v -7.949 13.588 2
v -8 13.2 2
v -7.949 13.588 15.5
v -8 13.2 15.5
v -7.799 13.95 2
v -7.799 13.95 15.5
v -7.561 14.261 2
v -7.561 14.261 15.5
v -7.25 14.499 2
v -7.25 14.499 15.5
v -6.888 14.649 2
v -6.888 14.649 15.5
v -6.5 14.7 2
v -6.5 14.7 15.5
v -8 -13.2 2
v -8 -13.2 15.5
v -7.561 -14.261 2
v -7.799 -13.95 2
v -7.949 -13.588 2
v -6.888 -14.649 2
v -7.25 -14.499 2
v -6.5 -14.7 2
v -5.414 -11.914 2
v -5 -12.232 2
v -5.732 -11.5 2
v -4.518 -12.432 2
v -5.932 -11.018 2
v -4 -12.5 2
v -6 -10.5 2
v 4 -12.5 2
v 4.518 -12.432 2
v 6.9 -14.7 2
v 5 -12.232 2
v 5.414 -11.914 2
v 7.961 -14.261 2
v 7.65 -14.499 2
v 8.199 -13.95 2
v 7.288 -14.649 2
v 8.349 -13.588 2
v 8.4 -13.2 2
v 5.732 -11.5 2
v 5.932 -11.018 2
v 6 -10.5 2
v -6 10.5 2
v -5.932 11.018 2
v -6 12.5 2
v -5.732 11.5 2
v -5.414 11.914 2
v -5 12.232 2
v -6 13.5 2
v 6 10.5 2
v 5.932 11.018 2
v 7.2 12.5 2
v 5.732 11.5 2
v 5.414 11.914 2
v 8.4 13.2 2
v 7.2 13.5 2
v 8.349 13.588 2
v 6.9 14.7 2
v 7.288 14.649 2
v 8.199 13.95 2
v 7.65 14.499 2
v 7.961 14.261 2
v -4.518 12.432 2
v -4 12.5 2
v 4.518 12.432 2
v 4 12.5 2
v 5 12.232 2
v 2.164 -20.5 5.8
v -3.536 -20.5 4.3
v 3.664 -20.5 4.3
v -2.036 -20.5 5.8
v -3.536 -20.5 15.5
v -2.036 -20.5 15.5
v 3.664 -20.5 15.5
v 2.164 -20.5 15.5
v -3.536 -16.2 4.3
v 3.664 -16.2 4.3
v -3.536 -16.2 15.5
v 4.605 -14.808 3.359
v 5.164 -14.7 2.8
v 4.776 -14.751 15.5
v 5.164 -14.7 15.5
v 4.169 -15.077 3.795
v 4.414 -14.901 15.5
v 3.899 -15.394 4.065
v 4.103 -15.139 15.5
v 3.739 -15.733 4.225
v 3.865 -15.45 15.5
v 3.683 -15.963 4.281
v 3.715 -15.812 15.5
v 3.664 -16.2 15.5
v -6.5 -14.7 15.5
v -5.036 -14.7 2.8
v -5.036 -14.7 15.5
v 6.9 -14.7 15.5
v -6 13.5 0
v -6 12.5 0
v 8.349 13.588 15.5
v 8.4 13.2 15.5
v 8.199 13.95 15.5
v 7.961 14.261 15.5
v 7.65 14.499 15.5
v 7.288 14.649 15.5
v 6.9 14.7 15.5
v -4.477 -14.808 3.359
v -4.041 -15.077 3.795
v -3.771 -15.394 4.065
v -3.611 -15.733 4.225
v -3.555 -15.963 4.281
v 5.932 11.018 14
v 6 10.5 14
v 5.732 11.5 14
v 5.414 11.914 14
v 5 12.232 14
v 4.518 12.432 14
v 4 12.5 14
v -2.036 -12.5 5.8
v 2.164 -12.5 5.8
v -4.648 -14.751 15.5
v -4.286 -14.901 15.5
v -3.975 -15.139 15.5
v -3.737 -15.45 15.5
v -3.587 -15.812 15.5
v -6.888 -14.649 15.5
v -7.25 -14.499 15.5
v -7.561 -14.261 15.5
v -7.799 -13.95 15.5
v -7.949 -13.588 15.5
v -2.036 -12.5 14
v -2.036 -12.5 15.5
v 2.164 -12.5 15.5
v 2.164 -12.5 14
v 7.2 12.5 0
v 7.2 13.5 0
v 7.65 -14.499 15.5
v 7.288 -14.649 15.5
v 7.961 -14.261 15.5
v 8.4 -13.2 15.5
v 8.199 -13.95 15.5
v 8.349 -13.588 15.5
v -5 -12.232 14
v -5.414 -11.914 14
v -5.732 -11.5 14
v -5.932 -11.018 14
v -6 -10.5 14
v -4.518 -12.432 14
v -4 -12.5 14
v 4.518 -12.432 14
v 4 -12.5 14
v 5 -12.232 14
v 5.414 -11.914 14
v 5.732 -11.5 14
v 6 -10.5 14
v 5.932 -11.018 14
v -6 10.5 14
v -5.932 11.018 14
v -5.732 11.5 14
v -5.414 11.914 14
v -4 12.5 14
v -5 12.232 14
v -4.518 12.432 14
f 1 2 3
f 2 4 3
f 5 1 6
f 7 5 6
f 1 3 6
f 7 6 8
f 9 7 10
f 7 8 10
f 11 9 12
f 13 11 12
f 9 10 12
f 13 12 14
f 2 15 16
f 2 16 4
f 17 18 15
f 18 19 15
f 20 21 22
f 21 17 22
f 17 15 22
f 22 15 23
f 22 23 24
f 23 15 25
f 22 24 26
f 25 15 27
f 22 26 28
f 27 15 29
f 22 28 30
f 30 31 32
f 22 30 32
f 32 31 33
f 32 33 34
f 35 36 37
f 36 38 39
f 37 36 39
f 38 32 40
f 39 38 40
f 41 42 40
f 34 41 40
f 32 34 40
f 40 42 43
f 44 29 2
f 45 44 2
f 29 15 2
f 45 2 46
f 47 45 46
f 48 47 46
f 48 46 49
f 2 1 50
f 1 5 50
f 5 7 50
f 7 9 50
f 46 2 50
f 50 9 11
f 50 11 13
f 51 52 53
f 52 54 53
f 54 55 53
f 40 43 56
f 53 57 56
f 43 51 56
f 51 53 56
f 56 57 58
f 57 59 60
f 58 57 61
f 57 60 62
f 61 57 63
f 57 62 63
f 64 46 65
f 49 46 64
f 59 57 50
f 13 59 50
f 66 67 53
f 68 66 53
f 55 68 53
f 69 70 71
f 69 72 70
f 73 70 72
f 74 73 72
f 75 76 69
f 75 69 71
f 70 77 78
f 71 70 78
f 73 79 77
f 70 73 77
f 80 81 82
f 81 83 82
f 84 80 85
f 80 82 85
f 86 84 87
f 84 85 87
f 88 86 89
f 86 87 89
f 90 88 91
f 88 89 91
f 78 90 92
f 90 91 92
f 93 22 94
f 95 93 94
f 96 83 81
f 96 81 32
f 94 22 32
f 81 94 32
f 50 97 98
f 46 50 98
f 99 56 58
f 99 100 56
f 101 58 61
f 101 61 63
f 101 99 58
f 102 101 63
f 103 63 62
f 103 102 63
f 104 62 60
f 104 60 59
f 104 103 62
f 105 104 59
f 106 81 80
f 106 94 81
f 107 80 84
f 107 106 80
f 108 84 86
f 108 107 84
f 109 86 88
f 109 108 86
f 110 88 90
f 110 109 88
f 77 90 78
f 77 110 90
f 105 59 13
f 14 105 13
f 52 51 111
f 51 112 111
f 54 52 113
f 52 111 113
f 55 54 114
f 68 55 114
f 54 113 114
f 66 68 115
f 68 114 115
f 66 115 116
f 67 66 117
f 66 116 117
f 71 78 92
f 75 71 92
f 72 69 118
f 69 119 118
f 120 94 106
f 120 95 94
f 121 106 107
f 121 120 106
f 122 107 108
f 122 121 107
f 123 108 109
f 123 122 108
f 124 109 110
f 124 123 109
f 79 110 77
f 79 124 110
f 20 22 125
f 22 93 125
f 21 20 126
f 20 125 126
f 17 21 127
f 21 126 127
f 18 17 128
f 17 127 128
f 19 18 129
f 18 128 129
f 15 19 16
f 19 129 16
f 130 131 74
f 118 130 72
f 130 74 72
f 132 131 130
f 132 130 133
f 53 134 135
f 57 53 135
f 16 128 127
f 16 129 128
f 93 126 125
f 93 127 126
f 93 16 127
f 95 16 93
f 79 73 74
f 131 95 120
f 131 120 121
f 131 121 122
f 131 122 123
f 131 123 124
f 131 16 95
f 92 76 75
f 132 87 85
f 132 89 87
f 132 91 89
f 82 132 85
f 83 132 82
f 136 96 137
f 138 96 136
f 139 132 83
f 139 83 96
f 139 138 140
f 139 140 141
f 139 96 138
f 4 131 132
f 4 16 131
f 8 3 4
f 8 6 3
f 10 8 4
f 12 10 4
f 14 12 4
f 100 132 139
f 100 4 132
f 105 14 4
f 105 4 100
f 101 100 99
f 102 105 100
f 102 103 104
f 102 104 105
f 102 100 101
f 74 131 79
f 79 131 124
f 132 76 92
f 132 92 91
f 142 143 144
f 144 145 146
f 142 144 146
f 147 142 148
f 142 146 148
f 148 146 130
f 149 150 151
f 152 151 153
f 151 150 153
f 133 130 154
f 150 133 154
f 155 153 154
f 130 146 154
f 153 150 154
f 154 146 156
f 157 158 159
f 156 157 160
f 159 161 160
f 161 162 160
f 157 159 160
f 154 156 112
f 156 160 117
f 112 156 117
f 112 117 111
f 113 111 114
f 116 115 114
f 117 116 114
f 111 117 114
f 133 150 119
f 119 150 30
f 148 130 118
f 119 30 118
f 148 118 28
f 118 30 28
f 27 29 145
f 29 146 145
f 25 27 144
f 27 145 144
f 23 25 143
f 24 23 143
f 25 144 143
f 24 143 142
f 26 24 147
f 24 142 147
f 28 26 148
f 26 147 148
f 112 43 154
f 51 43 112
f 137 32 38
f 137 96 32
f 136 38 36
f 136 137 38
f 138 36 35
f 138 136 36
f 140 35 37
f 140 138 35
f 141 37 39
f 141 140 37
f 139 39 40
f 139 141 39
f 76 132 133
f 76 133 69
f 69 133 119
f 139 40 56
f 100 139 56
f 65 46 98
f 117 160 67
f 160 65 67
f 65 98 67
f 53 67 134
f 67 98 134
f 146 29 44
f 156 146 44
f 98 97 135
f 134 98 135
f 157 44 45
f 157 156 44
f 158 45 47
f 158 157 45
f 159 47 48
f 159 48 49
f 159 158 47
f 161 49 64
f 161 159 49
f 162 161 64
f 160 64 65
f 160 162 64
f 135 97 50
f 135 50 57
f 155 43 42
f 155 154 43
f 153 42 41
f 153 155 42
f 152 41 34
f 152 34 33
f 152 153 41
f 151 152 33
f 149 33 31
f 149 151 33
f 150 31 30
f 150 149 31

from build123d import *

# Parameters (mm, degrees)
BOSS_EXTRUDE1_DEPTH   = 14
BOSS_EXTRUDE1_2_DEPTH = 14
BOSS_EXTRUDE2_START   = 2
SKETCH1_3_W           = 1.2
SKETCH1_3_H           = 25
BOSS_EXTRUDE2_DEPTH   = 12
SKETCH2_W             = 14.2
SKETCH2_H             = 27
SKETCH2_W_2           = 12
SKETCH2_H_2           = 25
BOSS_EXTRUDE3_DEPTH   = 1.5
SKETCH3_W             = 4.2
SKETCH3_H             = 8.2
SKETCH3_H_2           = 1.5
CUT_EXTRUDE1_DEPTH    = 1
BOSS_EXTRUDE4_DEPTH   = 7
FILLET2_R             = 2
SKETCH5_W             = 13.2
SKETCH5_H             = 1
CUT_EXTRUDE2_DEPTH    = 2
FILLET4_R             = 1
BOSS_EXTRUDE7_START   = -13.5
BOSS_EXTRUDE7_DEPTH   = 13.5
BOSS_EXTRUDE8_DEPTH   = 2.3
FILLET5_R             = 1.5
SKETCH10_W            = 0.4
SKETCH10_H            = 29.4
CUT_EXTRUDE3_DEPTH    = 13.5
FILLET6_R             = 1.5


with BuildPart() as part:
    # Sketch1 → Boss-Extrude1 (new body)
    with BuildSketch(Plane.XY):
        Polygon((7.2, 13.5), (-6, 13.5), (-6, 12.5), (6, 12.5), (7.2, 12.5), align=None)
    extrude(amount=BOSS_EXTRUDE1_DEPTH)



with BuildPart() as body_2:
    # Sketch1 → Boss-Extrude1 2 (new body)
    with BuildSketch(Plane.XY):
        Polygon((6, -12.5), (-6, -12.5), (-6, -13.5), (7.2, -13.5), (7.2, -12.5), align=None)
    extrude(amount=BOSS_EXTRUDE1_2_DEPTH)


with BuildPart() as part_1:
    add(part.part)

    add(body_2.part)  # Boss-Extrude2 merges body 2
    # Sketch1<3> → Boss-Extrude2 (add)
    with BuildSketch(Plane.XY.offset(BOSS_EXTRUDE2_START)):
        Polygon((-6, 12.5), (-6, 13.5), (-7, 13.5), (-7, -13.5), (-6, -13.5), (-6, -12.5), align=None)
        with Locations((6.6, 0)):
            Rectangle(SKETCH1_3_W, SKETCH1_3_H)
    extrude(amount=BOSS_EXTRUDE2_DEPTH)

    # Sketch2 → Boss-Extrude3 (add)
    # profile 1 of 2: a face of its own
    with BuildSketch(Plane.XY.offset(14)):
        with Locations((0.1, 0)):
            Rectangle(SKETCH2_W, SKETCH2_H)
        Rectangle(SKETCH2_W_2, SKETCH2_H_2, mode=Mode.SUBTRACT)
    # profile 2 of 2: a face of its own
    with BuildSketch(Plane.XY.offset(14)):
        Rectangle(SKETCH2_W_2, SKETCH2_H_2)
    extrude(amount=BOSS_EXTRUDE3_DEPTH)

    # Sketch3 → Cut-Extrude1 (cut)
    with BuildSketch(Plane.XZ.offset(13.5)):
        with Locations((0.063870968, 9.9)):
            Rectangle(SKETCH3_W, SKETCH3_H)
        with Locations((0.063870968, 14.75)):
            Rectangle(SKETCH3_W, SKETCH3_H_2)
    extrude(amount=-CUT_EXTRUDE1_DEPTH, mode=Mode.SUBTRACT)

    # Sketch4 → Boss-Extrude4 (add)
    with BuildSketch(Plane.XZ.offset(13.5)):
        Polygon((3.663870968, 15.5), (2.163870968, 15.5), (2.163870968, 5.8), (-2.036129032, 5.8), (-2.036129032, 15.5), (-3.536129032, 15.5), (-3.536129032, 4.3), (3.663870968, 4.3), align=None)
    extrude(amount=BOSS_EXTRUDE4_DEPTH)

    # Fillet2
    fillet2_edges = [part_1.edges().sort_by_distance(p)[0] for p in [
        (-6, -12.5, 8),
        (6, -12.5, 8),
        (6, 12.5, 8),
        (-6, 12.5, 8),
    ]]
    fillet(fillet2_edges, radius=FILLET2_R)

    # Sketch5 → Cut-Extrude2 (cut)
    with BuildSketch(Plane(origin=(0, 0, 2), x_dir=(-1, 0, 0), z_dir=(0, 0, -1))):
        with Locations((-0.6, -13)):
            Rectangle(SKETCH5_W, SKETCH5_H)
    extrude(amount=CUT_EXTRUDE2_DEPTH, mode=Mode.SUBTRACT)

    # Fillet4
    fillet4_edges = [part_1.edges().sort_by_distance(p)[0] for p in [
        (3.663870968, -13.5, 9.9),
        (0.063870968, -13.5, 4.3),
        (-3.536129032, -13.5, 9.9),
    ]]
    fillet(fillet4_edges, radius=FILLET4_R)

    # Sketch8 → Boss-Extrude7 (add)
    with BuildSketch(Plane.XY.offset(15.5).offset(BOSS_EXTRUDE7_START)):
        with BuildLine():
            Line((8.4, -14.7), (8.4, 14.7))
            Line((8.4, 14.7), (-8.4, 14.7))
            Line((-8.4, 14.7), (-8.4, -14.7))
            Line((-8.4, -14.7), (-3.536129032, -14.7))
            Line((-3.536129032, -14.7), (-3.536129032, -14.5))
            ThreePointArc((-3.536129032, -14.5), (-3.829022251, -13.792893219), (-4.536129032, -13.5))
            Line((-4.536129032, -13.5), (-7, -13.5))
            Line((-7, -13.5), (-7, 13.5))
            Line((-7, 13.5), (7.2, 13.5))
            Line((7.2, 13.5), (7.2, -13.5))
            Line((7.2, -13.5), (4.663870968, -13.5))
            ThreePointArc((4.663870968, -13.5), (3.956764187, -13.792893219), (3.663870968, -14.5))
            Line((3.663870968, -14.5), (3.663870968, -14.7))
            Line((3.663870968, -14.7), (8.4, -14.7))
        make_face()
    extrude(amount=BOSS_EXTRUDE7_DEPTH)

    # Sketch9 → Boss-Extrude8 (add)
    with BuildSketch(Plane(origin=(0, 0, 2), x_dir=(-1, 0, 0), z_dir=(0, 0, -1))):
        Polygon((-5.007987006, -14.7), (5.670470917, -14.7), (5.670470917, -12.839003899), (-4.79710184, -12.839003899), align=None)
    extrude(amount=-BOSS_EXTRUDE8_DEPTH)

    # Fillet5
    fillet5_edges = [part_1.edges().sort_by_distance(p)[0] for p in [
        (3.663870968, -14.7, 9.9),
        (-3.536129032, -14.7, 9.9),
        (0.063870968, -14.7, 4.3),
    ]]
    fillet(fillet5_edges, radius=FILLET5_R)

    # Sketch10 → Cut-Extrude3 (cut)
    with BuildSketch(Plane(origin=(0, 0, 2), x_dir=(-1, 0, 0), z_dir=(0, 0, -1))):
        with Locations((8.2, 0)):
            Rectangle(SKETCH10_W, SKETCH10_H)
    extrude(amount=-CUT_EXTRUDE3_DEPTH, mode=Mode.SUBTRACT)

    # Fillet6
    fillet6_edges = [part_1.edges().sort_by_distance(p)[0] for p in [
        (8.4, 14.7, 8.75),
        (8.4, -14.7, 8.75),
        (-8, 14.7, 8.75),
        (-8, -14.7, 8.75),
    ]]
    fillet(fillet6_edges, radius=FILLET6_R)


solid = part_1.part
